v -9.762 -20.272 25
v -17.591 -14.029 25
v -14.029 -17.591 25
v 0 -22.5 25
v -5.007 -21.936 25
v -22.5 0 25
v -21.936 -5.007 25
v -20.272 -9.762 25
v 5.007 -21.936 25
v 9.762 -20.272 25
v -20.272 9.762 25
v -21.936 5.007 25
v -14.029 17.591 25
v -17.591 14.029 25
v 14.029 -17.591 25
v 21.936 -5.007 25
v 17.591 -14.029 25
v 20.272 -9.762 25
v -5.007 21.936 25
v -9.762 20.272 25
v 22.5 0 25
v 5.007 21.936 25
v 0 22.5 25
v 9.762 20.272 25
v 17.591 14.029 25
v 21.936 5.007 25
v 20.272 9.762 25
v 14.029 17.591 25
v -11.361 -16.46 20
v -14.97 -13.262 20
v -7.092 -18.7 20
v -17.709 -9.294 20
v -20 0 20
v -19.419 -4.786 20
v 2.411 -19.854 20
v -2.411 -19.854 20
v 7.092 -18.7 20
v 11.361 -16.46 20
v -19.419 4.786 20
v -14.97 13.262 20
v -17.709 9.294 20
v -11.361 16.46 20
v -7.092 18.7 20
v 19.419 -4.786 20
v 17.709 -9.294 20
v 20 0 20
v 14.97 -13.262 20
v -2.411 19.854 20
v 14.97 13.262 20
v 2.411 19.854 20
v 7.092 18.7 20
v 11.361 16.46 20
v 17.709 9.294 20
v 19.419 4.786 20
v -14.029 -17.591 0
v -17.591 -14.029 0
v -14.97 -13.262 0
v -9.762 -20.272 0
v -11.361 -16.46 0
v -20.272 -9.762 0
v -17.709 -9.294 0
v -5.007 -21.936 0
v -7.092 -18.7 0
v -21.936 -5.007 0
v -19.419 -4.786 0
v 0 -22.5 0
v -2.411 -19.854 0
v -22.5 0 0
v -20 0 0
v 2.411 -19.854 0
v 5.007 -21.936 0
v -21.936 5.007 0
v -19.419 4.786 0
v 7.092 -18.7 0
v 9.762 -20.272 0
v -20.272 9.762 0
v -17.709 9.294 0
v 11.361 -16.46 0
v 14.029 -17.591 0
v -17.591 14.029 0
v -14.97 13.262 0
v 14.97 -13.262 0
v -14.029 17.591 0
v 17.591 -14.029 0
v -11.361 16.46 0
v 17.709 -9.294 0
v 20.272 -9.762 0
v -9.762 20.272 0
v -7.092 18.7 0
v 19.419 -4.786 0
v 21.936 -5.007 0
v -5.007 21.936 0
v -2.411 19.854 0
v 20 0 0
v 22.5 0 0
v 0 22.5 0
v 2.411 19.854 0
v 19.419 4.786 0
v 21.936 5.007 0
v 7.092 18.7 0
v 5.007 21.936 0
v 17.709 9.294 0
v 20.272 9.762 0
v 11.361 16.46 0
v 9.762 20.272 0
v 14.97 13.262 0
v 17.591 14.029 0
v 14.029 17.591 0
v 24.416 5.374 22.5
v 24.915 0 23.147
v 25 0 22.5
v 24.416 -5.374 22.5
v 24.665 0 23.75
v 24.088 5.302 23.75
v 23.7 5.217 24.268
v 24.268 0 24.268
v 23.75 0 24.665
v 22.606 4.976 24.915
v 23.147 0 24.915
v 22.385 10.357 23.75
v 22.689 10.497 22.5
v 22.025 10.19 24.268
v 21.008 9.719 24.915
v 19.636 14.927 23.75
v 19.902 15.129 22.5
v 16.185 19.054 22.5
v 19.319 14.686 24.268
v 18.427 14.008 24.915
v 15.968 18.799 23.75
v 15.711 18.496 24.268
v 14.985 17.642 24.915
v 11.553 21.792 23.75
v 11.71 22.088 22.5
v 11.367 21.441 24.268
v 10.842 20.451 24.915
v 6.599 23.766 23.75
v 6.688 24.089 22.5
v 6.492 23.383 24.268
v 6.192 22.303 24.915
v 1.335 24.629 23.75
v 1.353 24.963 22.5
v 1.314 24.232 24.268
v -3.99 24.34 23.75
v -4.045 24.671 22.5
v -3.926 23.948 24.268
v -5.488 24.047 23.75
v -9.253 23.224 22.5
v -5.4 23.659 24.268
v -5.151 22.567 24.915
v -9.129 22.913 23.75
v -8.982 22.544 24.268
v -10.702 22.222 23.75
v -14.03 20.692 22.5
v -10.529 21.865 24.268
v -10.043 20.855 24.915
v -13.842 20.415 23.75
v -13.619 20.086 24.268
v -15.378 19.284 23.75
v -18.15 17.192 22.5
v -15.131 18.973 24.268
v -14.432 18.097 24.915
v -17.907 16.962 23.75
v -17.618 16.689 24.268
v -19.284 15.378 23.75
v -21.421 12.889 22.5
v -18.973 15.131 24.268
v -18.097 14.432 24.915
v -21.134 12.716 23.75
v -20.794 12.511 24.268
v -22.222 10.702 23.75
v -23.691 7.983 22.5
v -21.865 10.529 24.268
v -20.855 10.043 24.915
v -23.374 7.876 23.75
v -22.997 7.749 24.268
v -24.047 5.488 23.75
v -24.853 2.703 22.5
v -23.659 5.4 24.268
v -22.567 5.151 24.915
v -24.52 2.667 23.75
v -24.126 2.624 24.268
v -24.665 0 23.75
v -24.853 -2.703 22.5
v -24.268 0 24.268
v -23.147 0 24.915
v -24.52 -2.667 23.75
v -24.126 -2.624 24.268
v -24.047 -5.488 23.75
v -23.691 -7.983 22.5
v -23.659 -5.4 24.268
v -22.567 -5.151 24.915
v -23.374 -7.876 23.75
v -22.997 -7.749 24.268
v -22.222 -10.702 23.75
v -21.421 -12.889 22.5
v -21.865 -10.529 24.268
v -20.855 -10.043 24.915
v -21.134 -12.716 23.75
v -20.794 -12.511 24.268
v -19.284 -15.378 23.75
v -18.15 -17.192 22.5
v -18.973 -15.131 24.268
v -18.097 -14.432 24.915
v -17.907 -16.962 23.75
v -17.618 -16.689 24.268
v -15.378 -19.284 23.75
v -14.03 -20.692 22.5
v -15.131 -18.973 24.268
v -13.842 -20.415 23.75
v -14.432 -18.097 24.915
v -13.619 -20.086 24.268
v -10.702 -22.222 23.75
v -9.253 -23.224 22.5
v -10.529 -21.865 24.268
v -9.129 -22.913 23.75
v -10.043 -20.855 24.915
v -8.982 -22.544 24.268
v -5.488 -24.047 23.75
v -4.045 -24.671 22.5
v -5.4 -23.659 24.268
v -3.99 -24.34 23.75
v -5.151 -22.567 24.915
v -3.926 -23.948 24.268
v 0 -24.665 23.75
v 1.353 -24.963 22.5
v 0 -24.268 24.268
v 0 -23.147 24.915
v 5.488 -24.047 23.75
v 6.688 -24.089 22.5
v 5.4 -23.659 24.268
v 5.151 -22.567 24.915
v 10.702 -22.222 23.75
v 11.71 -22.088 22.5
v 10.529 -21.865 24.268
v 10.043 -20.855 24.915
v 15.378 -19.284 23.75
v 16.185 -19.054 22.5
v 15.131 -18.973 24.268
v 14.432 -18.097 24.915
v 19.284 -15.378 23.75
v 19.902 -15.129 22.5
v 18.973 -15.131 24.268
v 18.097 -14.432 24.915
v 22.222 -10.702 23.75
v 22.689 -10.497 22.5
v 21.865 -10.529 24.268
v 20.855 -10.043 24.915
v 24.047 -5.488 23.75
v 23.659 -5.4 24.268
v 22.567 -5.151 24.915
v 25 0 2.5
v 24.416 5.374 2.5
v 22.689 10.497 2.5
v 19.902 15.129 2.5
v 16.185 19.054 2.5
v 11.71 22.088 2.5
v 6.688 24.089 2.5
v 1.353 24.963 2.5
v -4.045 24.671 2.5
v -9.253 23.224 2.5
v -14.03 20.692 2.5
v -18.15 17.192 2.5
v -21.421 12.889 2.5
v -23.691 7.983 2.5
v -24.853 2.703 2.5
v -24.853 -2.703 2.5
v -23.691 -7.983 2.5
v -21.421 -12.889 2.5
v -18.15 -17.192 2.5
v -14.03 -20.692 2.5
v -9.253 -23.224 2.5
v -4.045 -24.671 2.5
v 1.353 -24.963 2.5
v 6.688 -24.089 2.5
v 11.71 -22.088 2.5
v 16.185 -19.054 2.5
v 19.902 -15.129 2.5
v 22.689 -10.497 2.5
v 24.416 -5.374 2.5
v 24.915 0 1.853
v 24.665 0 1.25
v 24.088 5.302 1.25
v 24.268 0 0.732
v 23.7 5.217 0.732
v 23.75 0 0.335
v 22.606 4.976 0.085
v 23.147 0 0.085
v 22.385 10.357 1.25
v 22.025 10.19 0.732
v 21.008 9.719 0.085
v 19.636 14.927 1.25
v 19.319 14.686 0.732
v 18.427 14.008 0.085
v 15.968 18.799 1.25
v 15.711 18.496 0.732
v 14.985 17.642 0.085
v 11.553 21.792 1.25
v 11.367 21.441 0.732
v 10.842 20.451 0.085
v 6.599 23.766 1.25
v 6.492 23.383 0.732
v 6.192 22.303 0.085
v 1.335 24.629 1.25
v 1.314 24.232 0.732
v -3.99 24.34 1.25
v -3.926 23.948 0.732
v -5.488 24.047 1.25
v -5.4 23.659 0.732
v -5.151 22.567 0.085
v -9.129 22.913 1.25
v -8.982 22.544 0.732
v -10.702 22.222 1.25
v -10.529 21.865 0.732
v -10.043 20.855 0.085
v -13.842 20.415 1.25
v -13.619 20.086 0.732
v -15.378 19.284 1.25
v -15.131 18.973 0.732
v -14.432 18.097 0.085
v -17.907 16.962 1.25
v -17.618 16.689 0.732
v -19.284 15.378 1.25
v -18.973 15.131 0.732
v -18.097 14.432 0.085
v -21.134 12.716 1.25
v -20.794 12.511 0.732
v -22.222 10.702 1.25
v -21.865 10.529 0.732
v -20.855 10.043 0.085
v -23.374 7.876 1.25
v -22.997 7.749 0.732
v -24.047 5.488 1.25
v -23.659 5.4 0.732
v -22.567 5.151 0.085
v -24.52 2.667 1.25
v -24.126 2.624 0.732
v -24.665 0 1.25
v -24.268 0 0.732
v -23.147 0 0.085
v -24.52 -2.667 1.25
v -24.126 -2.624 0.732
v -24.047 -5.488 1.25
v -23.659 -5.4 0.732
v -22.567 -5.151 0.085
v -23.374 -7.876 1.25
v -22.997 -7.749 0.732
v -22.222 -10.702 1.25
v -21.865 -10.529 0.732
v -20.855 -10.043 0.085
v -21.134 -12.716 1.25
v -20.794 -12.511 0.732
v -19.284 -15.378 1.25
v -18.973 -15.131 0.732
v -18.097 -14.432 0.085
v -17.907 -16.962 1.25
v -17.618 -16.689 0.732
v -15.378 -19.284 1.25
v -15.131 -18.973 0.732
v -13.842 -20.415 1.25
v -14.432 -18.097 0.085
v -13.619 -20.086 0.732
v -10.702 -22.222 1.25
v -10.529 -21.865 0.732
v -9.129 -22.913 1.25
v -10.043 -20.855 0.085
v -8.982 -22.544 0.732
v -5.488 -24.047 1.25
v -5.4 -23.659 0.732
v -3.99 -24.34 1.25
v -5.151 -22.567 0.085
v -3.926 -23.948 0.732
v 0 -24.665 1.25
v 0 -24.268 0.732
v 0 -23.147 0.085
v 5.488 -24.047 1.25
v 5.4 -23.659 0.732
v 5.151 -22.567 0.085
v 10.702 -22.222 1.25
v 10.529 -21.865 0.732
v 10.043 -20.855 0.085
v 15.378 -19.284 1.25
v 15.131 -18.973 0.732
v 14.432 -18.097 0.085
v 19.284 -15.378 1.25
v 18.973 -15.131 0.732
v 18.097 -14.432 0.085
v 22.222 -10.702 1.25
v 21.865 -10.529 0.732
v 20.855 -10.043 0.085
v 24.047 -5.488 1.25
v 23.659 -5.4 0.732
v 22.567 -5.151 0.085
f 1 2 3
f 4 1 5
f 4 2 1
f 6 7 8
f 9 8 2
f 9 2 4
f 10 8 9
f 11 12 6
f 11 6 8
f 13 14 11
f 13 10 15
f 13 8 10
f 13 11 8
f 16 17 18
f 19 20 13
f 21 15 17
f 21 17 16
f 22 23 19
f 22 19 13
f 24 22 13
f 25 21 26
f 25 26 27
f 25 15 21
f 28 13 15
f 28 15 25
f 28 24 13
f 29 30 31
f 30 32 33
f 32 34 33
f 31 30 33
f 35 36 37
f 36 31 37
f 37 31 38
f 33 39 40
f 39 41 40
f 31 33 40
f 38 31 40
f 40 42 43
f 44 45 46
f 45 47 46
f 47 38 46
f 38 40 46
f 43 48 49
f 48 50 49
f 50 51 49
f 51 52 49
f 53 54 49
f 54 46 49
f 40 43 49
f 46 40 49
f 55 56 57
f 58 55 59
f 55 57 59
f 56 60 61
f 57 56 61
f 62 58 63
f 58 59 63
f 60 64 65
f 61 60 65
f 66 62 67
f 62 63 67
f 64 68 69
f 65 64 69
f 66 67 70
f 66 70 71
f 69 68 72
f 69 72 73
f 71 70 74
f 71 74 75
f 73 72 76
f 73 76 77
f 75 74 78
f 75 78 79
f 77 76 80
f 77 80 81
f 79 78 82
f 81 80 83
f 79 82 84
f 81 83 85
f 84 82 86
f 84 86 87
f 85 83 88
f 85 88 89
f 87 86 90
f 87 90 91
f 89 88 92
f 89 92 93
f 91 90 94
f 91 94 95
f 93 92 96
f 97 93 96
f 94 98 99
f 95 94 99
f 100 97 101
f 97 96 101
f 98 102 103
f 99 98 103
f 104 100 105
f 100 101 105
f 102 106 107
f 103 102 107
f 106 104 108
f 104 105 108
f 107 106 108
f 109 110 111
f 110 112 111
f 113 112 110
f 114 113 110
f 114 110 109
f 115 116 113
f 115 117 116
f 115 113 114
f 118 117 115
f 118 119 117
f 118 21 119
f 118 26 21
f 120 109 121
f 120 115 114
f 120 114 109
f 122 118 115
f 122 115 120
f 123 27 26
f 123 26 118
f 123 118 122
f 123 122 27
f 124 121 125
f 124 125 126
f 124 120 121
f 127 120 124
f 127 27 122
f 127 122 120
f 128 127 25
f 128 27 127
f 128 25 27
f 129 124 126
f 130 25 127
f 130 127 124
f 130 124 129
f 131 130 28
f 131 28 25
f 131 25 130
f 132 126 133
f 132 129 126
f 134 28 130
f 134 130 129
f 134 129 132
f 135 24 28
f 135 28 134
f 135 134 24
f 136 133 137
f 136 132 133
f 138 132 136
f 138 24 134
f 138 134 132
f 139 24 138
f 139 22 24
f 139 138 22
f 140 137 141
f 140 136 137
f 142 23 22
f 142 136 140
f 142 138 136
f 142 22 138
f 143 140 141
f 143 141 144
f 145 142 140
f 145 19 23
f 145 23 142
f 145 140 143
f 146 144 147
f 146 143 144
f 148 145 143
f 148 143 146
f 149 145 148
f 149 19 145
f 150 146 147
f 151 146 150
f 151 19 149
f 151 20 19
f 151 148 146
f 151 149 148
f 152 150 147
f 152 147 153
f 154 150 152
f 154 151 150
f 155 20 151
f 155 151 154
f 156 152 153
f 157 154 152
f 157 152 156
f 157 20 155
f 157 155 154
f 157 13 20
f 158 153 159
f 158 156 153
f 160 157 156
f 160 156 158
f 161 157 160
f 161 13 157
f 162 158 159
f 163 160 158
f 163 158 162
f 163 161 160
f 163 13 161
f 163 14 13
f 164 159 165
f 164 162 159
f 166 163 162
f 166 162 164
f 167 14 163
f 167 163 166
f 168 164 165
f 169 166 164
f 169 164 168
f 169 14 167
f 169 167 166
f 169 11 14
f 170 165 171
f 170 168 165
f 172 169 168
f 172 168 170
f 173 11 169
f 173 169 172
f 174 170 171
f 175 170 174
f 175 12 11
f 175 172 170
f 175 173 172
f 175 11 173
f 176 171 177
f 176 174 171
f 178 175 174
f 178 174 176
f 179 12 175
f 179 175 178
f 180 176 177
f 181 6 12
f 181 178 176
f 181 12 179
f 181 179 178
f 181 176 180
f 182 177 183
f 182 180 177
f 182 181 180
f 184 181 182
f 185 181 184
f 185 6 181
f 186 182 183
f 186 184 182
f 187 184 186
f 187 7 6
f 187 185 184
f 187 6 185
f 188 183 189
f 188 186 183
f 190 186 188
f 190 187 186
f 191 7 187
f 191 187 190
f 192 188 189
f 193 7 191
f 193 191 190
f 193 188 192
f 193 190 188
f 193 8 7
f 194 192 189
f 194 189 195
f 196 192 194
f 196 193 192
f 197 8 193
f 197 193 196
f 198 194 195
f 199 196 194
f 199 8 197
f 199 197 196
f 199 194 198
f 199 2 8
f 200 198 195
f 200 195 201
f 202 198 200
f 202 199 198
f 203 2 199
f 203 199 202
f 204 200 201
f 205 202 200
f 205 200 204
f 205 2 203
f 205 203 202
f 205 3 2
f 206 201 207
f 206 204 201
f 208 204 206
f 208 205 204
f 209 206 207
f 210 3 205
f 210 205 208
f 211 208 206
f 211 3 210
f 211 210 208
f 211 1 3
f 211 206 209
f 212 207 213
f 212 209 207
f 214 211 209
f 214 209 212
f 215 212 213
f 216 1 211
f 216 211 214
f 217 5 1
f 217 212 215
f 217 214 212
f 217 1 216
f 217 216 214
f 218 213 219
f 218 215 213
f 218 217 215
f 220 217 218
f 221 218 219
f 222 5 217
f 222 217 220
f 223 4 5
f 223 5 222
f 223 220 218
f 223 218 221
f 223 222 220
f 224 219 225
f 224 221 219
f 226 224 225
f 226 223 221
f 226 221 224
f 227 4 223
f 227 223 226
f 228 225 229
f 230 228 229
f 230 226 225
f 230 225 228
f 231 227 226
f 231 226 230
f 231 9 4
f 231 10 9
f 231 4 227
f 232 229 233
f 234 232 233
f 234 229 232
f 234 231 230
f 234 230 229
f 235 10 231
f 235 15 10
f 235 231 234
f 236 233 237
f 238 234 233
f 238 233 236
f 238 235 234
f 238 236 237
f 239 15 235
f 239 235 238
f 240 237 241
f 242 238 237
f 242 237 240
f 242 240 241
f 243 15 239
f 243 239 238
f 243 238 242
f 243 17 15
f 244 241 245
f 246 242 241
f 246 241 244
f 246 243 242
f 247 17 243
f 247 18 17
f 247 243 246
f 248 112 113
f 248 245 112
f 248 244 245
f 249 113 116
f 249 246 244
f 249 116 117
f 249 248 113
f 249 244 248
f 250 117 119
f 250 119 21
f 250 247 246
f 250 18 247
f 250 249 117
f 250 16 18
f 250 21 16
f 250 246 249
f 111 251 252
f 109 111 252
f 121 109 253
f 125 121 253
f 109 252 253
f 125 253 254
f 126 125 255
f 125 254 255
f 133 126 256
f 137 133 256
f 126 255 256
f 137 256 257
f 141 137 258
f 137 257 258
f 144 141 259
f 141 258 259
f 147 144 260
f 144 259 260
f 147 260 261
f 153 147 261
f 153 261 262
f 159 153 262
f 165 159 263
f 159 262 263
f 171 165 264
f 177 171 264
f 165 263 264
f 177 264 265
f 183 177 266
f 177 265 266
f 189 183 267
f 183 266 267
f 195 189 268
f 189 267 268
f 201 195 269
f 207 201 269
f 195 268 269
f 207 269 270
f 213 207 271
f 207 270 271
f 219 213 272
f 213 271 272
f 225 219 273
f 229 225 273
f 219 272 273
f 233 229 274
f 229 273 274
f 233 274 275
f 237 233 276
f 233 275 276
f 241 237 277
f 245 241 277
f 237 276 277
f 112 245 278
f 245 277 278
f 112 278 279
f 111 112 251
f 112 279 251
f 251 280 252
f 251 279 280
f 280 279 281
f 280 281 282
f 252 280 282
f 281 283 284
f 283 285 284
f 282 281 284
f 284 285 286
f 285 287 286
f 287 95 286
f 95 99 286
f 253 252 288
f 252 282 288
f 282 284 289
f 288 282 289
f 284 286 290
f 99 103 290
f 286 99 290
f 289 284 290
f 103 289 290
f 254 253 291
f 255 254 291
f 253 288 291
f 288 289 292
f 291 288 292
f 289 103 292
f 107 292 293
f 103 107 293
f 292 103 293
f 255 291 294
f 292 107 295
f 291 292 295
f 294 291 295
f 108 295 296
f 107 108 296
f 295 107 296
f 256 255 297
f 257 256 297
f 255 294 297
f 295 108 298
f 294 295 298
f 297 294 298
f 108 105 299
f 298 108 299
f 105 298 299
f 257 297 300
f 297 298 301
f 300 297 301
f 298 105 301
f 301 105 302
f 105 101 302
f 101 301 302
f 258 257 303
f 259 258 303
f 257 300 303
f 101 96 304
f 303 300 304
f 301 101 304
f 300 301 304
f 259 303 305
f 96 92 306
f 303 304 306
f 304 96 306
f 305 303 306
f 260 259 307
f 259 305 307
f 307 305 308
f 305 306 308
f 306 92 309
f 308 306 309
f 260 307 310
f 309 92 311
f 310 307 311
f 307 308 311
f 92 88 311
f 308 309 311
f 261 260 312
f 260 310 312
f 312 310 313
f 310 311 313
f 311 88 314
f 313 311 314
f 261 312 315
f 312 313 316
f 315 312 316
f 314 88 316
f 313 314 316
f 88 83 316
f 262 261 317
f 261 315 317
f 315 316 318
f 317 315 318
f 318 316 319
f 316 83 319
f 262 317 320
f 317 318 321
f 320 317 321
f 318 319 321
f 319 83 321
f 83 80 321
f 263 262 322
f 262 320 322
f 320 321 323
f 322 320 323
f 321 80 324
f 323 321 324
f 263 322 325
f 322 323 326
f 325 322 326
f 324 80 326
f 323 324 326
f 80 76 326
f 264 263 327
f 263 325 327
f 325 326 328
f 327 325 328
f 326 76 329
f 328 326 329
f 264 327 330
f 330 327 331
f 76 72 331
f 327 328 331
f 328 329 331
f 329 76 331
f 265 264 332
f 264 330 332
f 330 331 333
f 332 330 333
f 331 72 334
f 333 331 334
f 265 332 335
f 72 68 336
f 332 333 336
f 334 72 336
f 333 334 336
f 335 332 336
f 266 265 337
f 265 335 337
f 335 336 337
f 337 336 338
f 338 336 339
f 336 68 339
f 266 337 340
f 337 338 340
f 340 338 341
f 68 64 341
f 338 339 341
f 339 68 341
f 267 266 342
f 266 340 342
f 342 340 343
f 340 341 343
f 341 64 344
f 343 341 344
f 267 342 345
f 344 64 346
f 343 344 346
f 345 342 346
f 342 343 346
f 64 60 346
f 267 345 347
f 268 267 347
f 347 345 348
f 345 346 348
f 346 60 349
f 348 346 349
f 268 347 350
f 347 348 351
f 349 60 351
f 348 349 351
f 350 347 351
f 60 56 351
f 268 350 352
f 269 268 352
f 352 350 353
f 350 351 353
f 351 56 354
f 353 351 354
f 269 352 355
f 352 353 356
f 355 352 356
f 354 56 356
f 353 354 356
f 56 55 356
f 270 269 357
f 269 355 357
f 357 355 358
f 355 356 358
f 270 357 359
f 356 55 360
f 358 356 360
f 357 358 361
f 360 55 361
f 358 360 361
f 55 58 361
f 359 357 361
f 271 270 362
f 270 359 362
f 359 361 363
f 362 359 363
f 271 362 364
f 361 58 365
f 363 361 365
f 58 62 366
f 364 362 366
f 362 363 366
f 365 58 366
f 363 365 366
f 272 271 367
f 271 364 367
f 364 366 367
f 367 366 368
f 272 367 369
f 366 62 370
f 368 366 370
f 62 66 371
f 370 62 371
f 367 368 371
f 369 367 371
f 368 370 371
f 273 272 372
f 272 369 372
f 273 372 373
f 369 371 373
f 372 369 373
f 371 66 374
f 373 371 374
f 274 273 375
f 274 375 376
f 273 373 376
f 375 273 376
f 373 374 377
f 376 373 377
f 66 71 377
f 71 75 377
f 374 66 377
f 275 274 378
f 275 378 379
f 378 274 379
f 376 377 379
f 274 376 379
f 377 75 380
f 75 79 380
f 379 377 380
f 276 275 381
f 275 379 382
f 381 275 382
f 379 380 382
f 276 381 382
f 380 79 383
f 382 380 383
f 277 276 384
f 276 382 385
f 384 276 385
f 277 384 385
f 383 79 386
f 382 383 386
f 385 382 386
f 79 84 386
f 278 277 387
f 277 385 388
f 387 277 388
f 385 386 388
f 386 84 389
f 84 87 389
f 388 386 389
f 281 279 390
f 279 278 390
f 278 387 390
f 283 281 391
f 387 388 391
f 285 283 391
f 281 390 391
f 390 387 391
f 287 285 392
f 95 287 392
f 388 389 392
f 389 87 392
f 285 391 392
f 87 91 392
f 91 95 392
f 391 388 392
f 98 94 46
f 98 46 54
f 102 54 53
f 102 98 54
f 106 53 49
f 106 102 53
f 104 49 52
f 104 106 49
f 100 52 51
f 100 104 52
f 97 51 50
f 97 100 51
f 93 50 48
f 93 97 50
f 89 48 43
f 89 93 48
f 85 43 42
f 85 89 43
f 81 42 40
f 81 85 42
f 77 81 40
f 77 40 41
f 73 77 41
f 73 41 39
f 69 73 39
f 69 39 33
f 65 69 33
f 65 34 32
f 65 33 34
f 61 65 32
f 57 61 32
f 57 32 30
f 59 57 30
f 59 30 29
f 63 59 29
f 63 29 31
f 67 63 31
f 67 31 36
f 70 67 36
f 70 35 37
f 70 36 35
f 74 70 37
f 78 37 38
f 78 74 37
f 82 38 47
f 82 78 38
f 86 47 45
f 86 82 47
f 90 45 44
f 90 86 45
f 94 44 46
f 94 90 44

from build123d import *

# Parameters (mm, degrees)
F0_R     = 25
F1_DEPTH = 25
F2_T     = -5
F3_R     = 2.5
F4_R     = 2.5


with BuildPart() as f1:
    # F0 (on Top) → F1 (new body)
    with BuildSketch(Plane.XY):
        Circle(F0_R)
    extrude(amount=F1_DEPTH)

    # F2
    f2_openings = [f1.faces().sort_by_distance(p)[0] for p in [
        (0, 0, 0),
    ]]
    offset(amount=F2_T, openings=f2_openings)

    # F3
    f3_edges = [f1.edges().sort_by_distance(p)[0] for p in [
        (-25, 0, 25),
    ]]
    fillet(f3_edges, radius=F3_R)

    # F4
    f4_edges = [f1.edges().sort_by_distance(p)[0] for p in [
        (-25, 0, 0),
    ]]
    fillet(f4_edges, radius=F4_R)


solid = f1.part
